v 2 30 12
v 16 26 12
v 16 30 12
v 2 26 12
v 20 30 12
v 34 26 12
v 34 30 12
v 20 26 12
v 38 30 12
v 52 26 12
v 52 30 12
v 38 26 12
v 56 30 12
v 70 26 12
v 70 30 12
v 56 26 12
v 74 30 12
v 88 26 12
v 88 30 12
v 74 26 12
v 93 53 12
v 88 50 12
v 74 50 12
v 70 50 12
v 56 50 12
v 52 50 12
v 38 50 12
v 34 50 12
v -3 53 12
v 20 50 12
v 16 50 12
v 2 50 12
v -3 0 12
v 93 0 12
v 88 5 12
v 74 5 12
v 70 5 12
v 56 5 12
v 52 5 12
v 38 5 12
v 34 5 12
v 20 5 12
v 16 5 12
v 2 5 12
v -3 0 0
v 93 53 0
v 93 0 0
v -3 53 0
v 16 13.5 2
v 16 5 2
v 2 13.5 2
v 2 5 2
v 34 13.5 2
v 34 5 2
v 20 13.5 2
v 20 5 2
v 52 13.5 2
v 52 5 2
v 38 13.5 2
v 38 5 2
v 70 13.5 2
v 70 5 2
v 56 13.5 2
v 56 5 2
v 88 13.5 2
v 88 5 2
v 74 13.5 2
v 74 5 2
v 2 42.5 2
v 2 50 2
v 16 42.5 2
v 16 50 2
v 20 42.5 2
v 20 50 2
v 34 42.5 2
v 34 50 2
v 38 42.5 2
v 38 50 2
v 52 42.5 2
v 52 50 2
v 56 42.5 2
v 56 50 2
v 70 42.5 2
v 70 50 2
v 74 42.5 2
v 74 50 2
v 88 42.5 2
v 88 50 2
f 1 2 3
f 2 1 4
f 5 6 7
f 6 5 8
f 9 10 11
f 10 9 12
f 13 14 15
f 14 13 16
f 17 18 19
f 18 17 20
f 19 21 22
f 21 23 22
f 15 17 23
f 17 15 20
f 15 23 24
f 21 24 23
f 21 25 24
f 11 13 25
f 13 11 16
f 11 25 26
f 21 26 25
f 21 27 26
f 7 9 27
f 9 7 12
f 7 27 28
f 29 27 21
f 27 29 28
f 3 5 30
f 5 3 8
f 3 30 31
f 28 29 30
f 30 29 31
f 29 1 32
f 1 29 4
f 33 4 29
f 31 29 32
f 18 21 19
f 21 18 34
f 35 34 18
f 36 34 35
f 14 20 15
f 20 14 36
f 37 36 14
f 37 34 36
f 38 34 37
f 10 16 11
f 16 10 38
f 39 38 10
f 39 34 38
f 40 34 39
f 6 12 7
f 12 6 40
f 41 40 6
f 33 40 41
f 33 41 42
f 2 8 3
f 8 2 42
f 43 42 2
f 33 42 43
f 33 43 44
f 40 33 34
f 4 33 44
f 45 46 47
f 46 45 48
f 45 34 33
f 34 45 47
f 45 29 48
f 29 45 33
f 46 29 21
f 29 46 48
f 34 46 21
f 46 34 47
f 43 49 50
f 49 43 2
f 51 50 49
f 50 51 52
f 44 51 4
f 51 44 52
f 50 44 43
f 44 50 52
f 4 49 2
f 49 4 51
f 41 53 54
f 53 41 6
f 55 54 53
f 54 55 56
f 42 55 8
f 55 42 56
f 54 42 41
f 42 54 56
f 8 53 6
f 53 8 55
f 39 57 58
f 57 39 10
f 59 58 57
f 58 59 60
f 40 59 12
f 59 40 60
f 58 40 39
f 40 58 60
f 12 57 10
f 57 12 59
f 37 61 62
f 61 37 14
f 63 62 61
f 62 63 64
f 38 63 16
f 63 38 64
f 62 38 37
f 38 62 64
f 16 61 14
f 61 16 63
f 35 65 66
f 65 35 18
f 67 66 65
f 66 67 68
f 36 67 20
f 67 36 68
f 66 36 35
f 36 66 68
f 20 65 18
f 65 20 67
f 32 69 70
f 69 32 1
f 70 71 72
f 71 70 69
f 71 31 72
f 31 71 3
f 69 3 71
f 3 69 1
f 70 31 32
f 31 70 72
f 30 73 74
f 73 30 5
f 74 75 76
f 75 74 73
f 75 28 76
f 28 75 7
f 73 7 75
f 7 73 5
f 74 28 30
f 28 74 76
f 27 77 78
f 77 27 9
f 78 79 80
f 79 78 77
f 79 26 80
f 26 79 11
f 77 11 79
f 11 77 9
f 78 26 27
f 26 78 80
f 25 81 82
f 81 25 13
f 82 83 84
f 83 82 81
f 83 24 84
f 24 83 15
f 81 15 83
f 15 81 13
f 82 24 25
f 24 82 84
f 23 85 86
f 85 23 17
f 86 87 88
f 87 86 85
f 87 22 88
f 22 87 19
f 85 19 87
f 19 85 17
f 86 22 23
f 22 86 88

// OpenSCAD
/* [Global] */
// Rows of paint wells for the tray
rows = 2;
// Paint wells in each row
wellsPerRow = 5;
// Wall width of paint well exterior
wellWidth = 18;
// Wall length of paint well exterior
wellLength = 25;
// Wall height of paint well exterior
wellHeight = 12;
// Wall thickness of paint well interior
wellThickness = 2;
// Thickness of border between rows and around tray edge
borderThickness = 3;

module paintwell(width,length,height,thickness) {
    // 45 degree right triangle
    polyhedron(points = [
        [thickness,length/2 - thickness,thickness], //0
        [thickness,length - thickness,thickness], //1
        [thickness,length - thickness,height], //2
        [width - thickness,length/2 - thickness,thickness], //3
        [width - thickness,length - thickness,thickness], //4
        [width - thickness,length - thickness,height] //5
    ], faces = [
        [0,3,4,1], //bottom
        [2,5,3,0], //front
        [5,2,1,4], //back
        [5,4,3], //right
        [1,2,0] //left
    ], convexity = 10);

    difference() {
        cube([width, length, height]);

        translate([thickness,thickness,thickness])
            cube([width-thickness*2,length-thickness*2,height]);
    }
}

module trayBorder(width,length,height,thickness,rows,columns) {
    cube([width*columns,thickness,height]);
    translate([-thickness,0,0])
        cube([thickness,length*rows + thickness,height]);
    translate([width*columns,0,0])
        cube([thickness,length*rows + thickness,height]);
}

module paintTray(rows=2, wellsPerRow=5, wellWidth=18, wellLength=25, wellHeight=12, wellThickness=2, borderThickness=3) {
    trayBorder(wellWidth,wellLength,wellHeight,borderThickness,rows,wellsPerRow);

    for(i = [1:rows], j = [1:wellsPerRow]) {
        if(i % 2 == 1) { // odd
            translate([wellWidth*(j-1),wellLength*(i-1)+borderThickness,0]) {
                paintwell(width = wellWidth,length = wellLength,height = wellHeight,thickness = wellThickness);
            }
            translate([wellWidth*(j-1),wellLength*(i)+wellThickness,0])
                cube([wellWidth,borderThickness,wellHeight]);
        } else {
            translate([wellWidth*(j),wellLength*i+borderThickness,0]) rotate([0,0,180]) {
                paintwell(width = wellWidth,length = wellLength,height = wellHeight,thickness = wellThickness);
                cube([wellWidth,borderThickness,wellHeight]);
            }
        }
    }
}

paintTray(rows,wellsPerRow,wellWidth,wellLength,wellHeight,wellThickness,borderThickness);
